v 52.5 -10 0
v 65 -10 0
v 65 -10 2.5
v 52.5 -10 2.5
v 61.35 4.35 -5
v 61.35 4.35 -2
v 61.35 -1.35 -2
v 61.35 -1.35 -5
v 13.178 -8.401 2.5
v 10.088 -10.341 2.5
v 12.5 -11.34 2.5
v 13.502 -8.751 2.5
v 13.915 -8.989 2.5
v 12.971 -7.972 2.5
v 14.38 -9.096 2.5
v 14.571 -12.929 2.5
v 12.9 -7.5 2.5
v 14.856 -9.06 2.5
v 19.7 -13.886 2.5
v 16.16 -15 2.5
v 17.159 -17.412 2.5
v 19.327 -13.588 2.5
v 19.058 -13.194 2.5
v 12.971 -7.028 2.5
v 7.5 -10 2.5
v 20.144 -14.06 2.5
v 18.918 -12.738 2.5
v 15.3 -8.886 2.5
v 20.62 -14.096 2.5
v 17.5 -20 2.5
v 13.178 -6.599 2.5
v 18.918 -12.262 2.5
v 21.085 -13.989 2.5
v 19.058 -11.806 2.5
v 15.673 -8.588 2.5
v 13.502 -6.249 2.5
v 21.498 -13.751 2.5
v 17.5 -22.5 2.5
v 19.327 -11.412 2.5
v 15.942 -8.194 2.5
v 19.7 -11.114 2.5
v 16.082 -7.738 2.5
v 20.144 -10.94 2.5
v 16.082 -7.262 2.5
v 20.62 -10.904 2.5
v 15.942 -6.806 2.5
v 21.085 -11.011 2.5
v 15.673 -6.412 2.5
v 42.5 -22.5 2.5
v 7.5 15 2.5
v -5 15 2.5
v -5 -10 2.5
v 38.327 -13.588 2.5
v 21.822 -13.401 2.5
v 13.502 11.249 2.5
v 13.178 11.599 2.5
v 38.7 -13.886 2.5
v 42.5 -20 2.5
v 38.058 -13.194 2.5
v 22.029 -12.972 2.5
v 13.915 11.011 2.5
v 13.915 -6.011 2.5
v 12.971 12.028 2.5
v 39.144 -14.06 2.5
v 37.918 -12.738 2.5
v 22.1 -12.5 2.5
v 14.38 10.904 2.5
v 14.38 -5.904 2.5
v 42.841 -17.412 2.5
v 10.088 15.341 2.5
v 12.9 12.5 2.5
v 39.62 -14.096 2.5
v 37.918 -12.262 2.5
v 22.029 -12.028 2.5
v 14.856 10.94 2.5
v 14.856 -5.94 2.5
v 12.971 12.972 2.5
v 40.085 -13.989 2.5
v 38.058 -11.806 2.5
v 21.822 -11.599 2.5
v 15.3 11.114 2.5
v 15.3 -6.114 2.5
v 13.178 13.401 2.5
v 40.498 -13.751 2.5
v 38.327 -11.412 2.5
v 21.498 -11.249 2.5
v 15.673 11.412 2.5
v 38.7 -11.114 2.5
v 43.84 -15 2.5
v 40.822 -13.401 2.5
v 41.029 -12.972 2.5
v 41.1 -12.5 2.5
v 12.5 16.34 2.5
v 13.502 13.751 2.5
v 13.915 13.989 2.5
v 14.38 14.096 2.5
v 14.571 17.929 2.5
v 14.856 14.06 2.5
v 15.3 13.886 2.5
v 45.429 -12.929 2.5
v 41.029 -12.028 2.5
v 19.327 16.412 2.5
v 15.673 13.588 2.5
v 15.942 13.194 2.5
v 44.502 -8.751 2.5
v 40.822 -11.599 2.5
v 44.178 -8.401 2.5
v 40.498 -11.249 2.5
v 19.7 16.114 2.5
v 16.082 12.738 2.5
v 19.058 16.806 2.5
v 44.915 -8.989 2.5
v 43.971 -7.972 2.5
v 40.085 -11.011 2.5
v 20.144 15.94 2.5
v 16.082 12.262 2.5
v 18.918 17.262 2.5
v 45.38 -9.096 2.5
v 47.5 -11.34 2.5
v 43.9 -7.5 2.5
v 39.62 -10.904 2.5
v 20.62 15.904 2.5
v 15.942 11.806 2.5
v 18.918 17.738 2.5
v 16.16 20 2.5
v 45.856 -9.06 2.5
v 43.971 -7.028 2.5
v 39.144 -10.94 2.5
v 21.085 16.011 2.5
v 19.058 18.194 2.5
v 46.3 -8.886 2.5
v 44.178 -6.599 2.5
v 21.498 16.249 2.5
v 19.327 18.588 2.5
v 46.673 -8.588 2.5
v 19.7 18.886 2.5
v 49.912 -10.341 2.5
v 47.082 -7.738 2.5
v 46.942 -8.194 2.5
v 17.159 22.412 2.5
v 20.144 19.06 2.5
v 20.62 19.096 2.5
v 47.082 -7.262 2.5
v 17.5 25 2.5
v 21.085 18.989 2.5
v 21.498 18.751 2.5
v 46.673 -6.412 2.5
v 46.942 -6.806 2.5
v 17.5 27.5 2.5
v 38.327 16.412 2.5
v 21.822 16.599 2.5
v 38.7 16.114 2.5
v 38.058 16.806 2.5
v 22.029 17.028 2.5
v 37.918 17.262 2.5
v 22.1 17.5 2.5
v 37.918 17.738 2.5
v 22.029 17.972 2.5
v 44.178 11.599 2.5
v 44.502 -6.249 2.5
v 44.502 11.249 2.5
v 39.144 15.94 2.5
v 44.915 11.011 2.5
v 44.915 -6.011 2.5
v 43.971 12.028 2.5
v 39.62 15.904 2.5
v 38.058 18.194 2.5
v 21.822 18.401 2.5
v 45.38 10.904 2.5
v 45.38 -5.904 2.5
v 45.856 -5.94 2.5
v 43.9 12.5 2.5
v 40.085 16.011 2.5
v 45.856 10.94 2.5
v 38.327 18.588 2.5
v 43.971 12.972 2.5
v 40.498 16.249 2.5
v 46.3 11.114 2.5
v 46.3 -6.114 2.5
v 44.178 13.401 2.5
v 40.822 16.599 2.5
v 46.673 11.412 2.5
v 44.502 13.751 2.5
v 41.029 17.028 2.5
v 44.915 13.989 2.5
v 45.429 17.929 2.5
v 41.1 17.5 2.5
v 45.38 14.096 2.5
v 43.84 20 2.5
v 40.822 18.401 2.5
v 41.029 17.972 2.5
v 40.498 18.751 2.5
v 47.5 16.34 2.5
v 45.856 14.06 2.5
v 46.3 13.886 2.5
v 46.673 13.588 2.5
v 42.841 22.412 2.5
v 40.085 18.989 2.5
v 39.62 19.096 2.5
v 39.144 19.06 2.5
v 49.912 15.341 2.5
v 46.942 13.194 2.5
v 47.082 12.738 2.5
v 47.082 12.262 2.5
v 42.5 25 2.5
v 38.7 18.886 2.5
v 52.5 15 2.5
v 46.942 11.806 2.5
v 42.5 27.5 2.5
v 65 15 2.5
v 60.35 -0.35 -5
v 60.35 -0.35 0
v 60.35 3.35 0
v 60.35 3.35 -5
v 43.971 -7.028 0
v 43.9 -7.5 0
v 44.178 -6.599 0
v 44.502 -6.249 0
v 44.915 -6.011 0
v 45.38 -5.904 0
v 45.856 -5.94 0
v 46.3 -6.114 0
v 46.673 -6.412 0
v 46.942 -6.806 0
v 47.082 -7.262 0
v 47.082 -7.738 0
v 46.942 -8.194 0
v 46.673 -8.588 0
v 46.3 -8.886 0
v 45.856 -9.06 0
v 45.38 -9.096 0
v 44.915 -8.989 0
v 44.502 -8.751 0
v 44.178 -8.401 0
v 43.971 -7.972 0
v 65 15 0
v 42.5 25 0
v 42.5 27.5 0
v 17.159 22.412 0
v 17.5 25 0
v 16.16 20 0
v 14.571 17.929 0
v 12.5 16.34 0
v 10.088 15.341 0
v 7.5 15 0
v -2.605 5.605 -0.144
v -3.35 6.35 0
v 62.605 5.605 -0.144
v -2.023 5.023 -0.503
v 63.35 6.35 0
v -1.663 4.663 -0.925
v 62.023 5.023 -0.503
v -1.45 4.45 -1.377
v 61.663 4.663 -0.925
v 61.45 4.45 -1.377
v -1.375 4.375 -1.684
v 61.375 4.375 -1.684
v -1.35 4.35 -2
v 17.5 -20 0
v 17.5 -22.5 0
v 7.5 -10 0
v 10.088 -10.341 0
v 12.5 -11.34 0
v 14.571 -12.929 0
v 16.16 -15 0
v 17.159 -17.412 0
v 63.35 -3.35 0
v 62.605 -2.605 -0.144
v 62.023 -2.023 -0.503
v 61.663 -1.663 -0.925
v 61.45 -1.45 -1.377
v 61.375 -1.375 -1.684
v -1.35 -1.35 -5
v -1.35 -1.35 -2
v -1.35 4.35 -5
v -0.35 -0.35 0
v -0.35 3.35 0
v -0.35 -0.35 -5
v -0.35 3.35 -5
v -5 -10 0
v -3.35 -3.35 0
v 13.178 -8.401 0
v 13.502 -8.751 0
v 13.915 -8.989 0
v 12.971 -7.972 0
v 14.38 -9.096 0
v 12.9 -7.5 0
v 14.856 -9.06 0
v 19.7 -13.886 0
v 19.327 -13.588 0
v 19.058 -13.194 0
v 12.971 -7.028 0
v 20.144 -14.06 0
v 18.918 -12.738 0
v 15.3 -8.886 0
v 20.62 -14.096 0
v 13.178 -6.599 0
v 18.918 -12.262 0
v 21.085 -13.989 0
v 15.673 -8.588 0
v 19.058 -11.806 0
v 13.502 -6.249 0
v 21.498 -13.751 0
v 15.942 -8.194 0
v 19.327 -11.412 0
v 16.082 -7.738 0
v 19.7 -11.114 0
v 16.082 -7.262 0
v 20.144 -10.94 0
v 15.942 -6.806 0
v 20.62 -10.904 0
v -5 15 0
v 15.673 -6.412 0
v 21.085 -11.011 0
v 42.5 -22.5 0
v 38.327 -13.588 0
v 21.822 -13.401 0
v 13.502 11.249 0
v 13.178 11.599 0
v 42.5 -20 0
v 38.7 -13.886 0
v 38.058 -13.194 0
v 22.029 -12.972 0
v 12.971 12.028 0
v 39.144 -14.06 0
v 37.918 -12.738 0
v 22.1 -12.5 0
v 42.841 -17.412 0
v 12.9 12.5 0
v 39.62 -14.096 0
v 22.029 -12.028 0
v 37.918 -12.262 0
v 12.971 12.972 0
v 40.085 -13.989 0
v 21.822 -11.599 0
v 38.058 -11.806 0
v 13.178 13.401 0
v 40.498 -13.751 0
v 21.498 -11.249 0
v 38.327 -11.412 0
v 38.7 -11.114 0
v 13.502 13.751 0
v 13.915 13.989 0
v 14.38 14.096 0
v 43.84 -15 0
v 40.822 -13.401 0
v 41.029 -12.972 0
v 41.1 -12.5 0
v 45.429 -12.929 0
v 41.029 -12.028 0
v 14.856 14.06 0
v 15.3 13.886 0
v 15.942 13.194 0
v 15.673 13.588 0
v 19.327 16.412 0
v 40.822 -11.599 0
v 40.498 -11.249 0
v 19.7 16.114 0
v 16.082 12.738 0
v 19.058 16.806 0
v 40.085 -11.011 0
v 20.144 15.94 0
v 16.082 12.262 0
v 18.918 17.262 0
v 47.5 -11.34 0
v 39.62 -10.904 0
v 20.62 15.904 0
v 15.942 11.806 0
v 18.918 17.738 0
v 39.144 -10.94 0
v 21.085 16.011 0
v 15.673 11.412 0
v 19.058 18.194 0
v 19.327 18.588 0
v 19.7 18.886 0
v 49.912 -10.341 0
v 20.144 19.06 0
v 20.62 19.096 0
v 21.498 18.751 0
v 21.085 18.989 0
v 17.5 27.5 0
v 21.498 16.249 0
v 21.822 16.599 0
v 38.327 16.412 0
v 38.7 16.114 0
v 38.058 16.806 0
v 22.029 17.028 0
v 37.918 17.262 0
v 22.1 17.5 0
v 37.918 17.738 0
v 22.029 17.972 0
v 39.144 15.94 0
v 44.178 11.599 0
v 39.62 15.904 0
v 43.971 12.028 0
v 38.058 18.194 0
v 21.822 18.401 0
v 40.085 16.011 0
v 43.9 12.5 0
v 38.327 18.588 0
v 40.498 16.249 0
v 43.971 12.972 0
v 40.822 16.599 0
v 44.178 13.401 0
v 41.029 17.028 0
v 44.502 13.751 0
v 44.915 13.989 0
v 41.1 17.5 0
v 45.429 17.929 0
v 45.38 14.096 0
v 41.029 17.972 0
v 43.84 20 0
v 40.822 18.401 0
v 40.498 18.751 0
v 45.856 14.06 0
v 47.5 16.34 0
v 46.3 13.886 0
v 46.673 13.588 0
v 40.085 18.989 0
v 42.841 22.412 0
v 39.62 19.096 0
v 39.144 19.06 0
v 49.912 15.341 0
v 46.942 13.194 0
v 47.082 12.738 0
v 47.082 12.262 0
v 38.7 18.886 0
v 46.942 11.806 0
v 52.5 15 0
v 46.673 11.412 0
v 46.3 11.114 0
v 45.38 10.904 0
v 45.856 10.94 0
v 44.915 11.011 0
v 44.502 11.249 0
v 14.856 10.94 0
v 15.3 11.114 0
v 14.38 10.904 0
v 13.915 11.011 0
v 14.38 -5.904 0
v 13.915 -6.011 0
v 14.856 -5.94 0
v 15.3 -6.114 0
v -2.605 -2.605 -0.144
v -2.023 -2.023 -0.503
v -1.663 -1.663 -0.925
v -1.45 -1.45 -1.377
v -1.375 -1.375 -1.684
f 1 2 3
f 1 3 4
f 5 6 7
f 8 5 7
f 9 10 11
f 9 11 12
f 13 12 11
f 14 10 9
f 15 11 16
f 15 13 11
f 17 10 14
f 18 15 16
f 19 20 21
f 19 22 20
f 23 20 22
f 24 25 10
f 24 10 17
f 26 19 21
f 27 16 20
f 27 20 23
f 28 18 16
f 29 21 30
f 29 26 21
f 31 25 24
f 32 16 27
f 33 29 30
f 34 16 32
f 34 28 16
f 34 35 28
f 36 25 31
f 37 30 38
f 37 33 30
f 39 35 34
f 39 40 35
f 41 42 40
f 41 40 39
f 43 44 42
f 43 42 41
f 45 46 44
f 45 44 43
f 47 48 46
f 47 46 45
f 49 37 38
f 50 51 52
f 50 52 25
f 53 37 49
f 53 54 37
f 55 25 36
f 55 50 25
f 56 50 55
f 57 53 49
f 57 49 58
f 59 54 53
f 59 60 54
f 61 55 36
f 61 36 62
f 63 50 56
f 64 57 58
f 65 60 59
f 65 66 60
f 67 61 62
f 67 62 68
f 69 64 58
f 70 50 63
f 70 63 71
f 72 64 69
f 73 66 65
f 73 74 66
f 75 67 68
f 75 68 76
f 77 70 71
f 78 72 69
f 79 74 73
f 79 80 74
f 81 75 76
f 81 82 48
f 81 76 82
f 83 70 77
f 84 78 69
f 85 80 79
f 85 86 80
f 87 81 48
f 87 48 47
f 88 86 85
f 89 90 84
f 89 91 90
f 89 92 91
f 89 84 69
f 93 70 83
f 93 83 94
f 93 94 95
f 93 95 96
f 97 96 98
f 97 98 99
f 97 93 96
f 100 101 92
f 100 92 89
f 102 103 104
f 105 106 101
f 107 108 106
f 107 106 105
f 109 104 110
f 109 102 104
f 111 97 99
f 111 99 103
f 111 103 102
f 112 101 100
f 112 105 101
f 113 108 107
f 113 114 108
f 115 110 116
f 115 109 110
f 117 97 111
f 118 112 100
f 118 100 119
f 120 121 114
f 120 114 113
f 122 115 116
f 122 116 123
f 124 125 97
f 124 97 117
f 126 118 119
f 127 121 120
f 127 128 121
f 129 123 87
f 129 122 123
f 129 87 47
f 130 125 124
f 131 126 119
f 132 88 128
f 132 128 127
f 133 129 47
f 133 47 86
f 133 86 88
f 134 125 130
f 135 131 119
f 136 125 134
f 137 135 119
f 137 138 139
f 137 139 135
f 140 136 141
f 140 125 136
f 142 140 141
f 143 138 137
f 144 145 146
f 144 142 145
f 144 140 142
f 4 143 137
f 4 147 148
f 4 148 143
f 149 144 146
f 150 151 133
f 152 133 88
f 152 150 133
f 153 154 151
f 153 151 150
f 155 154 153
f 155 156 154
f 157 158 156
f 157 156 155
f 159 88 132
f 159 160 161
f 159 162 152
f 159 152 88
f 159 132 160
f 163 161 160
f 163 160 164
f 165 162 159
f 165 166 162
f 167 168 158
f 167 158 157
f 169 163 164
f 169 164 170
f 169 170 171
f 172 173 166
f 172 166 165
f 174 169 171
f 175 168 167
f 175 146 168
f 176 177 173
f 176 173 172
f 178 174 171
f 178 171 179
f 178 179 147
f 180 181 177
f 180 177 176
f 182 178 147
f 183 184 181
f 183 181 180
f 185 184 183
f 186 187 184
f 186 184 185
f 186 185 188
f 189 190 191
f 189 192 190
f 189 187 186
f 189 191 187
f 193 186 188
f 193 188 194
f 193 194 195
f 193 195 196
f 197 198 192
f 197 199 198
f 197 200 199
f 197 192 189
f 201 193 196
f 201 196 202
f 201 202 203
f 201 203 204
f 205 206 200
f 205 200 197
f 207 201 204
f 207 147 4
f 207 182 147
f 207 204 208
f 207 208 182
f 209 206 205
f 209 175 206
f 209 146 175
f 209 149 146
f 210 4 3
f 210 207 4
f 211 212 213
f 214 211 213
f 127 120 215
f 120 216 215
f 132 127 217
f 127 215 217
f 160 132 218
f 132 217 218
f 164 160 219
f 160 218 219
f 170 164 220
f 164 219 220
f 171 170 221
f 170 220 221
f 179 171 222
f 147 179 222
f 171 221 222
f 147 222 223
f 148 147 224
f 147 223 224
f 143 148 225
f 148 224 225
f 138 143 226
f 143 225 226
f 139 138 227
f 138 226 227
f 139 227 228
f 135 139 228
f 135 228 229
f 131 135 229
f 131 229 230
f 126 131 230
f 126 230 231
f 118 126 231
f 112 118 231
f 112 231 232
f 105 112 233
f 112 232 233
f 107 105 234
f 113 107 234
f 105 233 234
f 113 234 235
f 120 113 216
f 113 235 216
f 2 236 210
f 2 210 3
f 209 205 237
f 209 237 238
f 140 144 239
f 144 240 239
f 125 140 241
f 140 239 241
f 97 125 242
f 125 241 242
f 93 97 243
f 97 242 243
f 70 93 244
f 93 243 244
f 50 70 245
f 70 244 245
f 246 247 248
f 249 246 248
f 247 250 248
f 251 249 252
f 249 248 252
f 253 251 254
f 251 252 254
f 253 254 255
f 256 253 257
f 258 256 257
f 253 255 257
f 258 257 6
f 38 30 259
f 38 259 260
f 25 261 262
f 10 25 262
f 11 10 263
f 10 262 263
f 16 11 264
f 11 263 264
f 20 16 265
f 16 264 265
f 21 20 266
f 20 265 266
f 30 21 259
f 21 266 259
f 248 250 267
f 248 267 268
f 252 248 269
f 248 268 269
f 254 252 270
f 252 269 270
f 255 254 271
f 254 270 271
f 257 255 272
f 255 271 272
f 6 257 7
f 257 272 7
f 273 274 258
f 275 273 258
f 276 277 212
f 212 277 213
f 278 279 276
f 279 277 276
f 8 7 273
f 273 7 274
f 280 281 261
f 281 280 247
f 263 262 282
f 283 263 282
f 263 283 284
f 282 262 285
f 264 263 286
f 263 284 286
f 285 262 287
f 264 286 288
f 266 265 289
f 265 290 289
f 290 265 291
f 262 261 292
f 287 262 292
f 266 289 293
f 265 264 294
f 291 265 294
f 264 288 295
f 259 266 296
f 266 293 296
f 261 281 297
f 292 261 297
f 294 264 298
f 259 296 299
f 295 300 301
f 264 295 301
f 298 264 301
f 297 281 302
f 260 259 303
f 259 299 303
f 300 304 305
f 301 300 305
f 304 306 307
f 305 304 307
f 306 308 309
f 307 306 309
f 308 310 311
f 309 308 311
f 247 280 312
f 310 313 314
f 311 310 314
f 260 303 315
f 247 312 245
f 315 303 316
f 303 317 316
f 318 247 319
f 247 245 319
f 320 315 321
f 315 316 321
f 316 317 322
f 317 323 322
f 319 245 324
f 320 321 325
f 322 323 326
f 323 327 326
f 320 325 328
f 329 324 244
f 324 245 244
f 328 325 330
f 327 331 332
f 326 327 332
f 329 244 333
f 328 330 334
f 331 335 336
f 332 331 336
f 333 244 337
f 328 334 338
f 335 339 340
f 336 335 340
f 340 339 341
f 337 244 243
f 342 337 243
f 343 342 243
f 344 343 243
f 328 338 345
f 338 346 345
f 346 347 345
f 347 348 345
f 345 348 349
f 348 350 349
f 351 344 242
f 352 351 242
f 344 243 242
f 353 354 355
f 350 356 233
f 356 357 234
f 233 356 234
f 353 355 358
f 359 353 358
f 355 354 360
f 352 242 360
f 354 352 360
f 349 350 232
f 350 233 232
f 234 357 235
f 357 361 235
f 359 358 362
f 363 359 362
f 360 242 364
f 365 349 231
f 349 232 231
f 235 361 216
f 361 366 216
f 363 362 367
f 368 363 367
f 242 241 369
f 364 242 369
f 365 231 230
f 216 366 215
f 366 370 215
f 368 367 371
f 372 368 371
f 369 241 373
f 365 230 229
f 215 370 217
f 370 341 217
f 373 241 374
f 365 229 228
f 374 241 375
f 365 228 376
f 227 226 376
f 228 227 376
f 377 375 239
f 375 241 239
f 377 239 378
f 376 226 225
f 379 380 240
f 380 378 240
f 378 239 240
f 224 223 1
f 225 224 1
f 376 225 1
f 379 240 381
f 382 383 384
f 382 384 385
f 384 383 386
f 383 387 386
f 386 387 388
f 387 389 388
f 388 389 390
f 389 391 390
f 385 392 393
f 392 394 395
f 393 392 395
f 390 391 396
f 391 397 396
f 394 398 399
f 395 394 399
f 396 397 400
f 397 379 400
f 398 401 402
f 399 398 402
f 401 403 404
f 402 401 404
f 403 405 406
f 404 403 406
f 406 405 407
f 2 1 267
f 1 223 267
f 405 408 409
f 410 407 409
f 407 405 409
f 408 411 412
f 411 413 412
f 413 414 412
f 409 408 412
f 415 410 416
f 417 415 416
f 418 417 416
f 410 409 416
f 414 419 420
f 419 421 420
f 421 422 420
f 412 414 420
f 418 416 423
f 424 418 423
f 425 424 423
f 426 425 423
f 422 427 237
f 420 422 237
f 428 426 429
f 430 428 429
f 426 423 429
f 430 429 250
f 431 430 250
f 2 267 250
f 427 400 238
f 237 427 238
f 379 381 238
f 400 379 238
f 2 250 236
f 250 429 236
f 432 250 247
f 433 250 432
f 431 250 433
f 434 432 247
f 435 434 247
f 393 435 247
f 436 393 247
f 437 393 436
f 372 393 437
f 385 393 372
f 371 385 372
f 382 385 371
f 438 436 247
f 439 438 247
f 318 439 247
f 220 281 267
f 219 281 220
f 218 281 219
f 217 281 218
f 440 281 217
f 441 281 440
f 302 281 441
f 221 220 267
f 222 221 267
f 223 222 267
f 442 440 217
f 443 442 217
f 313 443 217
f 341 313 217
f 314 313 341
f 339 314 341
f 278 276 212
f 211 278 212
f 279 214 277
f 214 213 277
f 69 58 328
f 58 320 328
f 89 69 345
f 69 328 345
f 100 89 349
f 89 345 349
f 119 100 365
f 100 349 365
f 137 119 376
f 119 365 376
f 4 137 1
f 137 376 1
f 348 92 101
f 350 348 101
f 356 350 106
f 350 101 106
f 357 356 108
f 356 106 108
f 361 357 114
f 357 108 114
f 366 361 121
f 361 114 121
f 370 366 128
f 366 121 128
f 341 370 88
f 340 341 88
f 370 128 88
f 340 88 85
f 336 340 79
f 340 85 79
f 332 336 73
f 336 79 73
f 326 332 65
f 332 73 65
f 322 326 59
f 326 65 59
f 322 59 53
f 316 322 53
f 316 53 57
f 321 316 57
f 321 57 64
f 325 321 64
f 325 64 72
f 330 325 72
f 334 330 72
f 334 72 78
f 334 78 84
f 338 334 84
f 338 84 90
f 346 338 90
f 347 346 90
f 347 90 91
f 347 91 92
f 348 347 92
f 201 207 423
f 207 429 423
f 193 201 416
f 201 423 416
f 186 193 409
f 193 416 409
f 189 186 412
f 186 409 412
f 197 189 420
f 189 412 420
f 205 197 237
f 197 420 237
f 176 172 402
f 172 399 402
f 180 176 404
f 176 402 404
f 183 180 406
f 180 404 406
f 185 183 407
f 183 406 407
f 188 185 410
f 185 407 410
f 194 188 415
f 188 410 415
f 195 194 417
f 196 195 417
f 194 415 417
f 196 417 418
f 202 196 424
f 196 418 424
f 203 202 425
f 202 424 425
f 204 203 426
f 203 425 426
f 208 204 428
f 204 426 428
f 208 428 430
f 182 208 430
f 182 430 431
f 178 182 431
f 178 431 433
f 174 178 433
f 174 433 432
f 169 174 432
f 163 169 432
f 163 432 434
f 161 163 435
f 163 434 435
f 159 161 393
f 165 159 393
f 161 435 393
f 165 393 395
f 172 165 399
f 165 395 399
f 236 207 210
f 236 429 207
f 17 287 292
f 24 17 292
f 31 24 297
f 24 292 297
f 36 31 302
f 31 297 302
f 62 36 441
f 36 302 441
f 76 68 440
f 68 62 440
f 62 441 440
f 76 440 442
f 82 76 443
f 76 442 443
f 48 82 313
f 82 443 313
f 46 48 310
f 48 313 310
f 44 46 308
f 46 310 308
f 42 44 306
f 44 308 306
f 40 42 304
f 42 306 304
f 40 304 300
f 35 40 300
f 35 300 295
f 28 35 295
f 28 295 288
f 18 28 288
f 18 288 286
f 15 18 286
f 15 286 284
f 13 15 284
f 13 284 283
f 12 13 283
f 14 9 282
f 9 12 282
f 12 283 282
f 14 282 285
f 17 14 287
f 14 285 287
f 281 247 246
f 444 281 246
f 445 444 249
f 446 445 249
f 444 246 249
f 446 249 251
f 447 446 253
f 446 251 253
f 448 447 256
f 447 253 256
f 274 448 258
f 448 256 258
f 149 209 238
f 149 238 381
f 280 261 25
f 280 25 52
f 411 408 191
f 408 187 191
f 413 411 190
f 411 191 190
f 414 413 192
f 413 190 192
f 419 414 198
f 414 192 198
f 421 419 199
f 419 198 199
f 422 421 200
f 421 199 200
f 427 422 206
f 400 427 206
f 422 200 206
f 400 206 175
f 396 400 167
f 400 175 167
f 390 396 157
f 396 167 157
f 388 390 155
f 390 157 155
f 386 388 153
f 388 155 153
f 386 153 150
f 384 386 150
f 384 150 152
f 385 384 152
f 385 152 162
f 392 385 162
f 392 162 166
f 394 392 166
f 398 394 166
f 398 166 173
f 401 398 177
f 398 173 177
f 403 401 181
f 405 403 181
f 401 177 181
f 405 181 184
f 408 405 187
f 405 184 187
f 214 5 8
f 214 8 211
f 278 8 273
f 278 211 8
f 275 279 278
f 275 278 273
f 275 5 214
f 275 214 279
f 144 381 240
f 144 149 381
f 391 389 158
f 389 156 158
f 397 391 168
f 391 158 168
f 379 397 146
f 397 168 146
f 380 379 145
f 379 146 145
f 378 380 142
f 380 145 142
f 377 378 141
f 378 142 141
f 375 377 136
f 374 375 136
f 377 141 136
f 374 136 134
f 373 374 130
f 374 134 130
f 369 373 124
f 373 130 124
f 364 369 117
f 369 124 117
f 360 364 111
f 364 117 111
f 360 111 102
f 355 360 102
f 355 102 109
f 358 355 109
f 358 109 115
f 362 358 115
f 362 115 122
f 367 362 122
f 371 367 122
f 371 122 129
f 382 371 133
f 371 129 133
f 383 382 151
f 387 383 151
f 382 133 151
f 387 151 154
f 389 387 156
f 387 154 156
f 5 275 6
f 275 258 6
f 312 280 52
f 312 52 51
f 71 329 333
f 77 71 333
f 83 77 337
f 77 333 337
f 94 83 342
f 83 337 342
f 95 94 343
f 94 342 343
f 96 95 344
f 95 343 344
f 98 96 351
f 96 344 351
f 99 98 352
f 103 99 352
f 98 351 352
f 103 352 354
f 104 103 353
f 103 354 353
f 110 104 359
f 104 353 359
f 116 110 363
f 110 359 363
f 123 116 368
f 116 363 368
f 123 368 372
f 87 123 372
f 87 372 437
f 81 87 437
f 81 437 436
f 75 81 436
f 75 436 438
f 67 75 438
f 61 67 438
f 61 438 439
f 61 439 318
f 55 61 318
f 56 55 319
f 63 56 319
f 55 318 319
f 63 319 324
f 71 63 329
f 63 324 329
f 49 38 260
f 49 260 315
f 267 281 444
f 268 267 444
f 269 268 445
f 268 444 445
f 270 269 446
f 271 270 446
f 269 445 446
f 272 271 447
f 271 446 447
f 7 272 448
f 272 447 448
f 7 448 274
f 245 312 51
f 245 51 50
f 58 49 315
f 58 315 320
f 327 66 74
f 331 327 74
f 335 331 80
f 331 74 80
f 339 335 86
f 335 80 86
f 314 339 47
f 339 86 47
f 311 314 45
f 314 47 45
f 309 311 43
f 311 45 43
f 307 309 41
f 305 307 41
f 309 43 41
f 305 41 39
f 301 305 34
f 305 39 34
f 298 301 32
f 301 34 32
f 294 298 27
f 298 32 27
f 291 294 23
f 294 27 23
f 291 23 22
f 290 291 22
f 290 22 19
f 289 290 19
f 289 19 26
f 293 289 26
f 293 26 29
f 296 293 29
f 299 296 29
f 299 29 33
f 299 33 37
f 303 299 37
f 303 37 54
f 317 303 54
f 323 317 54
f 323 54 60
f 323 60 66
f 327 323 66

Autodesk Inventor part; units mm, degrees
ref_plane "YZ Plane" through (0, 0, 0) normal (1, 0, 0) x (0, 1, 0)
ref_plane "XZ Plane" through (0, 0, 0) normal (0, 1, 0) x (-1, 0, 0)
ref_plane "XY Plane" through (0, 0, 0) normal (0, 0, 1) x (1, 0, 0)
sketch "Sketch1" plane through (0, 0, 0) normal (0, 0, 1) x (1, 0, 0)
  line L0 (65, 8) -> (65, -5) projected
  line L1 (-5, -5) -> (-5, 8) projected
  line L2 (-5, 8) -> (65, 8) projected
  line L3 (65, 8) -> (65, -5) projected
  line L4 (65, -5) -> (-5, -5) projected
  line L5 (-5, 15) -> (65, 15)
  line L6 (65, 15) -> (65, -10)
  line L7 (65, -10) -> (-5, -10)
  line L8 (-5, -10) -> (-5, 15)
  line L9 (-5, 15) -> (65, -10) construction
  line L10 (65, 15) -> (-5, -10) construction
  point P0 (0, 0)
  point P1 (30, 2.5)
  dimension "d0" = 25
extrude "Extrusion1" add sketch "Sketch1" along normal blind 2.5
sketch "Sketch2" plane through (0, 0, 0) normal (0, 0, -1) x (-1, 0, 0)
  line L0 (-60, 0) -> (0, 0) projected
  line L1 (0, 0) -> (0, 3) projected
  line L2 (-60, 3) -> (0, 3) projected
  line L3 (-60, 0) -> (-60, 3) projected
  line L4 (0.35, -0.35) -> (-60.35, -0.35)
  line L5 (-60.35, -0.35) -> (-60.35, 3.35)
  line L6 (-60.35, 3.35) -> (0.35, 3.35)
  line L7 (0.35, 3.35) -> (0.35, -0.35)
  line L8 (-61.35, -1.35) -> (1.35, -1.35)
  line L9 (1.35, -1.35) -> (1.35, 4.35)
  line L10 (1.35, 4.35) -> (-61.35, 4.35)
  line L11 (-61.35, 4.35) -> (-61.35, -1.35)
  dimension "d3" = 0.35
  dimension "d4" = 1
extrude "Extrusion2" add sketch "Sketch2" along normal blind 5 contours L11 L10 L9 L8
fillet "Fillet1" radius 2 4 edges at (30, -1.35, 0) (-1.35, 1.5, 0) (30, 4.35, 0) (61.35, 1.5, 0)
sketch "Sketch3" plane through (0, 0, 0) normal (0, 0, -1) x (-1, 0, 0)
  line L0 (-65, -9.278) -> (-65, -5)
  line L1 (-47.2, 0) -> (-43.8, 0) projected
  line L2 (-45.5, 0) -> (-45.5, -10) construction
  line L3 (-16.2, 0) -> (-12.8, 0) projected
  line L4 (-14.5, 0) -> (-14.5, -7.5)
  circle A0 centre (-14.5, -7.5) radius 1.6
  line L5 (5, -10) -> (-65, -10) construction
  circle A1 centre (-14.5, -7.5) radius 1.5
  line L6 (-65, 2.5) -> (5, 2.5) construction
  line L7 (-65, -10) -> (-65, -5)
  line L8 (-65, -10) -> (-65, 15) projected
  line L9 (-65, -7.5) -> (5, -7.5) construction
  line L10 (5, 15) -> (5, -10) construction
  circle A2 centre (-45.5, -7.5) radius 1.6
  circle A3 centre (-14.5, 12.5) radius 1.6
  circle A4 centre (-45.5, 12.5) radius 1.6
  point P0 (0, 0)
  dimension "d11" = 3.2
  dimension "d28" = 3.2
extrude "Extrusion3" cut sketch "Sketch3" against normal up to surface (2.5 mm away) contours A1 | A0 | A2 | A3 | A4
sketch "Sketch4" plane through (0, 0, 2.5) normal (0, 0, 1) x (1, 0, 0)
  line L0 (65, -10) -> (65, 15) projected
  circle A0 centre (14.5, 12.5) radius 1.6 projected
  circle A1 centre (45.5, -7.5) radius 1.6 projected
  circle A2 centre (14.5, -7.5) radius 1.6 projected
  circle A3 centre (45.5, 12.5) radius 1.6 projected
  line L1 (-5, 15) -> (-5, -10) projected
  line L2 (-5, -10) -> (65, -10) projected
  line L3 (65, -10) -> (65, 15) projected
  line L4 (65, 15) -> (-5, 15) projected
  line L5 (65, 2.5) -> (-5, 2.5) construction
  line L6 (-5, 15) -> (-5, -10) construction
  line L7 (30, 15) -> (30, -10) construction
  line L8 (42.5, 27.5) -> (17.5, 27.5)
  line L9 (17.5, 27.5) -> (17.5, -22.5)
  line L10 (17.5, -22.5) -> (42.5, -22.5)
  line L11 (42.5, -22.5) -> (42.5, 27.5)
  line L12 (42.5, 27.5) -> (17.5, -22.5) construction
  line L13 (17.5, 27.5) -> (42.5, -22.5) construction
  circle A4 centre (39.5, -12.5) radius 1.6
  circle A5 centre (20.5, -12.5) radius 1.6
  circle A6 centre (39.5, 17.5) radius 1.6
  circle A7 centre (20.5, 17.5) radius 1.6
  point P0 (0, 0)
  point P1 (30, 2.5)
  point P2 (17.5, 15)
  point P3 (42.5, 15)
  point P4 (42.5, -10)
  point P5 (17.5, -10)
  dimension "d29" = 25
  dimension "d30" = 50
  dimension "d31" = 2.5
  dimension "d32" = 3
  dimension "d35" = 2.5
  dimension "d36" = 3
  dimension "d37" = 3.2
extrude "Extrusion4" add sketch "Sketch4" against normal up to surface (2.5 mm away) contours L11 L10 L9 L2 | L4 L9 L8 L11
fillet "Fillet2" radius 10 4 edges at (42.5, -10, 1.25) (42.5, 15, 1.25) (17.5, 15, 1.25) (17.5, -10, 1.25)
equation "\"d28\" = d11"
equation "\"d37\" = d11"
properties part number "CombineTestBase"
